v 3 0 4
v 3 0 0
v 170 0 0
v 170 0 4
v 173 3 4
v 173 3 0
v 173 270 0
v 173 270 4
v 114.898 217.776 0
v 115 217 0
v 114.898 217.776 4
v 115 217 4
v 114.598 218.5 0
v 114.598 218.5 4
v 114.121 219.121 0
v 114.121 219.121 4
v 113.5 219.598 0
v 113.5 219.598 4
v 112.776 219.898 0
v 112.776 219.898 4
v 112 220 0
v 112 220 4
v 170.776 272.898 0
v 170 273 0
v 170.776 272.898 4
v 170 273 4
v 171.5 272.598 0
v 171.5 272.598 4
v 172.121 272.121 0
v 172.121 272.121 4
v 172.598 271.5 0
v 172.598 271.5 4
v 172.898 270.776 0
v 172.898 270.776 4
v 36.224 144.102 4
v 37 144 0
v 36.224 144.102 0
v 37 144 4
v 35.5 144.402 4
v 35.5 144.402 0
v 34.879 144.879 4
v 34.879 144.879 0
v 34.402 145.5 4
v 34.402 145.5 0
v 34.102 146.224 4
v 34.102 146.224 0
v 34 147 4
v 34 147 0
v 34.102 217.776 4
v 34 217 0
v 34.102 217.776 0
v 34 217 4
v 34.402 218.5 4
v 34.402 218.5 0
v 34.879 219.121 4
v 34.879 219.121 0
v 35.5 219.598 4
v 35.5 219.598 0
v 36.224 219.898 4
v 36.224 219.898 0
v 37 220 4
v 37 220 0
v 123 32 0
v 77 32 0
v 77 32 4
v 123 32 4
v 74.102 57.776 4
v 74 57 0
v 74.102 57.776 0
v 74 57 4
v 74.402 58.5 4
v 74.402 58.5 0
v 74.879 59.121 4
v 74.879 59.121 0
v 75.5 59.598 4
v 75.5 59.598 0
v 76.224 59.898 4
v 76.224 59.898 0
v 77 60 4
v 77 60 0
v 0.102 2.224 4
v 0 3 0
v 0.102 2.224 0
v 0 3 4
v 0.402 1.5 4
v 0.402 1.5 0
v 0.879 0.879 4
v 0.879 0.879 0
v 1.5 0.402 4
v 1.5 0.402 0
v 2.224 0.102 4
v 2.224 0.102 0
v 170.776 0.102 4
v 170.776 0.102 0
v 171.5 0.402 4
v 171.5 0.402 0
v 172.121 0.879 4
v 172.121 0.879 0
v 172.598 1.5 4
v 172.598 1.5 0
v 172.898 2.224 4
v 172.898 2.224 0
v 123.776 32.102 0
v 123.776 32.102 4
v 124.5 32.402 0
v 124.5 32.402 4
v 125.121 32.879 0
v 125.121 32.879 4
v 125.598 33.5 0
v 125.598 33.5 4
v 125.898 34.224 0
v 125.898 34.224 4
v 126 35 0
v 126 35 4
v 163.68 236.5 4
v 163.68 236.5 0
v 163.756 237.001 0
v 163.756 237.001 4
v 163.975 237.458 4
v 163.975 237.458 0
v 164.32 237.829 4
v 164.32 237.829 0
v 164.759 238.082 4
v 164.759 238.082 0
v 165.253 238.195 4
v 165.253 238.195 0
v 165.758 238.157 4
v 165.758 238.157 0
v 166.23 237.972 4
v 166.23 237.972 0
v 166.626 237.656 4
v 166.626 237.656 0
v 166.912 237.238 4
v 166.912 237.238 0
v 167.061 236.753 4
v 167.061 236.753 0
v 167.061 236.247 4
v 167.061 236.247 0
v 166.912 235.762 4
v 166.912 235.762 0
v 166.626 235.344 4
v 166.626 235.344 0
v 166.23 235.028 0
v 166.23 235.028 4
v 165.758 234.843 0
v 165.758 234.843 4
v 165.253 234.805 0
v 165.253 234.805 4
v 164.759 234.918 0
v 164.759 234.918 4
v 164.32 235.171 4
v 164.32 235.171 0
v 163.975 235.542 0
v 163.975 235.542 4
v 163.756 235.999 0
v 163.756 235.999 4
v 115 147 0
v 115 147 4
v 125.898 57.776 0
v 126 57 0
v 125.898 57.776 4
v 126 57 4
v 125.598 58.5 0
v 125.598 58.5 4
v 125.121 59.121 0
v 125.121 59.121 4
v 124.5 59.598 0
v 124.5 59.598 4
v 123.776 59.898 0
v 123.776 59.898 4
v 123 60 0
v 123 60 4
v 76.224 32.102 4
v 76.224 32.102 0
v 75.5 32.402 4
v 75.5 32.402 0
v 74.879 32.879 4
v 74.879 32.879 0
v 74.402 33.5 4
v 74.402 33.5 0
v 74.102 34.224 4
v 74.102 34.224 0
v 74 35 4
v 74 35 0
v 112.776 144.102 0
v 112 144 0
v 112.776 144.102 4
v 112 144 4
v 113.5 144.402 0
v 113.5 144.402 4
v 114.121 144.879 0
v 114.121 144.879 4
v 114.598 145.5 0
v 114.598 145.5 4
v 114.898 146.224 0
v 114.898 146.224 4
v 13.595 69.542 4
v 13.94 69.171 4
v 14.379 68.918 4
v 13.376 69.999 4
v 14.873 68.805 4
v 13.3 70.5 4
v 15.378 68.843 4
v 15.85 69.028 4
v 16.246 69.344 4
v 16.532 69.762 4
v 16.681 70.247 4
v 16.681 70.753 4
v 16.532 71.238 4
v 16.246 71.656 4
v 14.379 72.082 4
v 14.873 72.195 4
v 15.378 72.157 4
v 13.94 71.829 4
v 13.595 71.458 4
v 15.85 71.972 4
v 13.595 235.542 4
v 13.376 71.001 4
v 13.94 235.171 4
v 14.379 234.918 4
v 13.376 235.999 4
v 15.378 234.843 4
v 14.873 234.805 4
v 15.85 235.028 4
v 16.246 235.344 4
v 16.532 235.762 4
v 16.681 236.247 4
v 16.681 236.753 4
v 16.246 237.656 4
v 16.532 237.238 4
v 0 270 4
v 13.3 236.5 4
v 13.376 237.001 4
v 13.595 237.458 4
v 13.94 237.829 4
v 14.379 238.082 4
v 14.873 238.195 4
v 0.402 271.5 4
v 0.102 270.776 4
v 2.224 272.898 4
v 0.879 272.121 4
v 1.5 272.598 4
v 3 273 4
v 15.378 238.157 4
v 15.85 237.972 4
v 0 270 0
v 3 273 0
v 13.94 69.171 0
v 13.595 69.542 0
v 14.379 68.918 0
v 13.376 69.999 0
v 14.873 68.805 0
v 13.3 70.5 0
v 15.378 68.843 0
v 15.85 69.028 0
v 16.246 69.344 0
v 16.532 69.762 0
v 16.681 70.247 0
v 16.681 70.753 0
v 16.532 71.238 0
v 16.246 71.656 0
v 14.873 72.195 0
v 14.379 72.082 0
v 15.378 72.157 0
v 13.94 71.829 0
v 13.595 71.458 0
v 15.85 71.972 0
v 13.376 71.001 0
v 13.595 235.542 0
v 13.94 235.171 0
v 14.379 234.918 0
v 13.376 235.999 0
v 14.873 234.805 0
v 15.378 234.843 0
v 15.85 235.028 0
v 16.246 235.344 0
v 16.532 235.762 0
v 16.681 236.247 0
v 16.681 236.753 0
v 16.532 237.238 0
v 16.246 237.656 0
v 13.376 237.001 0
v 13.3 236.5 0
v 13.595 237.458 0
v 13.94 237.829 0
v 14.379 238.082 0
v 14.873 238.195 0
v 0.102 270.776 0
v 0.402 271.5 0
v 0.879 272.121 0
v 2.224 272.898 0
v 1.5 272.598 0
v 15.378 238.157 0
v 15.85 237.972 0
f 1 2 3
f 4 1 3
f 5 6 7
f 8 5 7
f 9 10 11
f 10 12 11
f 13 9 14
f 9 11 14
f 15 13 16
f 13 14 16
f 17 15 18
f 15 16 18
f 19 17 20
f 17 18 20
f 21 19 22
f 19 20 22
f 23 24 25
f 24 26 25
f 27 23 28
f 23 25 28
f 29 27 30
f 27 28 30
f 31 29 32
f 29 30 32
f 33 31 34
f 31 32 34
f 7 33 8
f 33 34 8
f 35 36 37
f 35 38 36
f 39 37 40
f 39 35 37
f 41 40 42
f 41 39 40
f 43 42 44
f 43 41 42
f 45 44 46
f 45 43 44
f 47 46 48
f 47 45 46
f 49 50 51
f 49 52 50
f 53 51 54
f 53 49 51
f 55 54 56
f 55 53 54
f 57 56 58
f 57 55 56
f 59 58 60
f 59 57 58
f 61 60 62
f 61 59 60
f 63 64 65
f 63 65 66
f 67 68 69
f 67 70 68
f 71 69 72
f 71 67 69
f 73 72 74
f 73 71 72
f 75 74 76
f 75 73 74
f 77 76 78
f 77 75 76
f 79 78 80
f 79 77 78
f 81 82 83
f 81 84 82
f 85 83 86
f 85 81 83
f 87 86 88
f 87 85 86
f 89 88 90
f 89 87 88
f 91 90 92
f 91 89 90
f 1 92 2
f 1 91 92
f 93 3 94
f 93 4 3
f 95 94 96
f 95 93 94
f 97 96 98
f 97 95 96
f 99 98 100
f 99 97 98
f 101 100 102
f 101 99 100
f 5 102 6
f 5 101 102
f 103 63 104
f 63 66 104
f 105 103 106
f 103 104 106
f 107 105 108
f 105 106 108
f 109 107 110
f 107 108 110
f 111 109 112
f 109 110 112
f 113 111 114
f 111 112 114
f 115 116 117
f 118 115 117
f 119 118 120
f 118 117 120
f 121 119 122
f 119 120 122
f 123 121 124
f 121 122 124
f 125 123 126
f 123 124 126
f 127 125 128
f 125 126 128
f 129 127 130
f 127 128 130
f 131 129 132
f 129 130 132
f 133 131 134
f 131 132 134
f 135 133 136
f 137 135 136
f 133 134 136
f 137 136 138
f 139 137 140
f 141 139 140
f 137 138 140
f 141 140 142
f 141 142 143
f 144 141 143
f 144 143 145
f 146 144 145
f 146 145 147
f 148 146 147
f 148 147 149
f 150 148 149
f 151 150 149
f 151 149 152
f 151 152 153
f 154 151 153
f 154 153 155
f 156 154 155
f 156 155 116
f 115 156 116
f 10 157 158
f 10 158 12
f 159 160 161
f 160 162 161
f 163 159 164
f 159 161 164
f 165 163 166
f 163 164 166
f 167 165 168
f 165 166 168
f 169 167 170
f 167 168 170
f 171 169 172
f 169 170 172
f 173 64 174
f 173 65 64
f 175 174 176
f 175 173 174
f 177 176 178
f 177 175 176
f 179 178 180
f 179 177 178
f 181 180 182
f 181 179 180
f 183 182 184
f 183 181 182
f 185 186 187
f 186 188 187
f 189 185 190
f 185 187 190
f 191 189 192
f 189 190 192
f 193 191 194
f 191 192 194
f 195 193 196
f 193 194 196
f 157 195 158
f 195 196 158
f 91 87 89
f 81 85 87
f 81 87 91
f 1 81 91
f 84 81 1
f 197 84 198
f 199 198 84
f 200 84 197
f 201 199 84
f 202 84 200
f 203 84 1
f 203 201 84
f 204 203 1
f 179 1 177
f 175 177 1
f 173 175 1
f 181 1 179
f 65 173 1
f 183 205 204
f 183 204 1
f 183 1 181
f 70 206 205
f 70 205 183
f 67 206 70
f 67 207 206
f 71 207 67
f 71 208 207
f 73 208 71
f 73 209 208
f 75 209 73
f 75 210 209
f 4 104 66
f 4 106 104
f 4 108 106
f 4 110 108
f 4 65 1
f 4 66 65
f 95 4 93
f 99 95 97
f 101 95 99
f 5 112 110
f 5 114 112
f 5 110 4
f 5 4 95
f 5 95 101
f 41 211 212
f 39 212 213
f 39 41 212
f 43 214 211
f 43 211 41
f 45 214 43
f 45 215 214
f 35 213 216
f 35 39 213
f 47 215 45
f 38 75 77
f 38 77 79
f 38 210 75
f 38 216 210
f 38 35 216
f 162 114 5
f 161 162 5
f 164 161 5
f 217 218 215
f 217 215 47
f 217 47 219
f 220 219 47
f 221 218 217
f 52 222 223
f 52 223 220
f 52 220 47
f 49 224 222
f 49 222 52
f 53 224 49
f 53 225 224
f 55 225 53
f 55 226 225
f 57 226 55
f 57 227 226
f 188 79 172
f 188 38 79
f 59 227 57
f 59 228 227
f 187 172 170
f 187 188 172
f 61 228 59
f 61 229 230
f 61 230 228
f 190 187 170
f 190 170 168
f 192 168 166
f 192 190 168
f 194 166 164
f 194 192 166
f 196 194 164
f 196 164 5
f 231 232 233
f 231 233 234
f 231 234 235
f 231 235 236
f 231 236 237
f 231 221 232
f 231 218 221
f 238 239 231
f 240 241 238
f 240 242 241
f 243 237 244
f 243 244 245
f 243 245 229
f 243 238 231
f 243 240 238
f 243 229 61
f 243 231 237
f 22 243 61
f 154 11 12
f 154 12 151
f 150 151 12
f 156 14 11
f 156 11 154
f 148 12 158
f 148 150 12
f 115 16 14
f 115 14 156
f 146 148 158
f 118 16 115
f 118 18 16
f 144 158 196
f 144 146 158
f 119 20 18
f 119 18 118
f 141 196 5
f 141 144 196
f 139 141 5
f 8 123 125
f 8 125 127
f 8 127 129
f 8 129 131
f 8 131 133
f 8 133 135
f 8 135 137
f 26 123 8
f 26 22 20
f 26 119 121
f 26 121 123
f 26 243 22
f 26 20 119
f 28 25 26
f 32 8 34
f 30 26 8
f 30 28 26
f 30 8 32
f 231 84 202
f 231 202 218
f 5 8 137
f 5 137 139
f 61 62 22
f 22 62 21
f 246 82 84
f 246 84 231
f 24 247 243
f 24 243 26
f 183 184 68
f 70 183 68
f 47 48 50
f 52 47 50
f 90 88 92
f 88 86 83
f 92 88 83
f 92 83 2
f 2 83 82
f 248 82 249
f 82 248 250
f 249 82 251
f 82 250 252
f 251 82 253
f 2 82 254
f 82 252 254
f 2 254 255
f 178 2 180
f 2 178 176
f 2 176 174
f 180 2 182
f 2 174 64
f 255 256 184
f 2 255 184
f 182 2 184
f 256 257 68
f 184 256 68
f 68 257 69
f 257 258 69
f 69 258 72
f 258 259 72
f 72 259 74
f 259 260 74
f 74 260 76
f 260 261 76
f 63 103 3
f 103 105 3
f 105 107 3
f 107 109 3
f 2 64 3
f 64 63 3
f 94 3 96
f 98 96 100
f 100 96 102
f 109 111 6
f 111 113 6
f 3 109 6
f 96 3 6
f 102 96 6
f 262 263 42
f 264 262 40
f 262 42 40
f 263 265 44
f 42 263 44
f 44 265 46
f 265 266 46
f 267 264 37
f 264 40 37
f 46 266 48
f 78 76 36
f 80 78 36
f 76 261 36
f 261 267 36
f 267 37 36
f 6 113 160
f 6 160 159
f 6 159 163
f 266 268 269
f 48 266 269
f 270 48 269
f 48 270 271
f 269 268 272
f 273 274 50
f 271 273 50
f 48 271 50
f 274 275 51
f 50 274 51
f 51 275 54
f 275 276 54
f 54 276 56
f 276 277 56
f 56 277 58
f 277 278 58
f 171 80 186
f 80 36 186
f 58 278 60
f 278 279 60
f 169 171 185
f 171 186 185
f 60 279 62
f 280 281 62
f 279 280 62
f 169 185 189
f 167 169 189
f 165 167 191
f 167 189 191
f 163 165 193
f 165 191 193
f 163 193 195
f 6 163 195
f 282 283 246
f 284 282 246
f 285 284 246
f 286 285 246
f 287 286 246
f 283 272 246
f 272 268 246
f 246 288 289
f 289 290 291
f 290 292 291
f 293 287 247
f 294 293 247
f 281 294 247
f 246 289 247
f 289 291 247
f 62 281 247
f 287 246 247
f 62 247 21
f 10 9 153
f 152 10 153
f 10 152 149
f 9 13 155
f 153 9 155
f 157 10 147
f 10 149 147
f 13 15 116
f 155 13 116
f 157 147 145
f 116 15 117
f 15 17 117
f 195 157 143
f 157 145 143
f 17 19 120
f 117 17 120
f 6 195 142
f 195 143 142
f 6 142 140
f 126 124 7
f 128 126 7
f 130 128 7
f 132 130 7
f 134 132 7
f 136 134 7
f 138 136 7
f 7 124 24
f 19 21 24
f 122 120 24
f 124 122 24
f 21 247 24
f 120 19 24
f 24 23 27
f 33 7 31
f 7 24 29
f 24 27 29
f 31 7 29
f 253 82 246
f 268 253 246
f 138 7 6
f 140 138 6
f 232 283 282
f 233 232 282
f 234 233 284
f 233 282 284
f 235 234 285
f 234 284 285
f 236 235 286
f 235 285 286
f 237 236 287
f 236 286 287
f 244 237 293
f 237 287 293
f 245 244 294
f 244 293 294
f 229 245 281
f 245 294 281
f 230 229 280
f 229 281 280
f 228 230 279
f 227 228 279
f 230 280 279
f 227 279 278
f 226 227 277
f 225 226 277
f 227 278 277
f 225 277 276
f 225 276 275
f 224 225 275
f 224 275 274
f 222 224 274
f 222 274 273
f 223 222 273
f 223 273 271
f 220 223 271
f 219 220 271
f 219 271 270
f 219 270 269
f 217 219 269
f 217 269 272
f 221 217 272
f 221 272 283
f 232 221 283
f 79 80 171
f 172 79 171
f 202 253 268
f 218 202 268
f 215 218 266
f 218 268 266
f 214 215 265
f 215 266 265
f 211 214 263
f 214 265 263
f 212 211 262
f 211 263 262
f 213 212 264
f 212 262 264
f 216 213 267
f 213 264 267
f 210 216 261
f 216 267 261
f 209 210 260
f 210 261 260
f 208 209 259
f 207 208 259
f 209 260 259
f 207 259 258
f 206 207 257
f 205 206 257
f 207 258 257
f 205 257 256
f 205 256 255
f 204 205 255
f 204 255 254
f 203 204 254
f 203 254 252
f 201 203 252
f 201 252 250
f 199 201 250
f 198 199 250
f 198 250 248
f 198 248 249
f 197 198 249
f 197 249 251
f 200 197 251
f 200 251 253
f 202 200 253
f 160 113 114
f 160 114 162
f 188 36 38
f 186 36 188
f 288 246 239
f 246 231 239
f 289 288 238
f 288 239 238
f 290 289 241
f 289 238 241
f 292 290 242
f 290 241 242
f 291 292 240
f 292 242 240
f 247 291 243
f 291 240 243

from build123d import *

# Parameters (mm, degrees)
ESQUISSE1_W        = 173
ESQUISSE1_H        = 273
ESQUISSE1_R        = 1.5
ESQUISSE1_W_2      = 52
ESQUISSE1_H_2      = 28
ESQUISSE1_W_3      = 81
ESQUISSE1_H_3      = 76
BOSS_EXTRU_1_DEPTH = 4
D_GAGEMENT_M31_D   = 3.4
CONG_1_R           = 3


with BuildPart() as part:
    # Esquisse1 → Boss.-Extru.1 (new body)
    with BuildSketch(Plane.XY):
        with Locations((86.5, 136.5)):
            Rectangle(ESQUISSE1_W, ESQUISSE1_H)
        with Locations((15, 236.5)):
            Circle(ESQUISSE1_R, mode=Mode.SUBTRACT)
        with Locations((165.38, 236.5)):
            Circle(ESQUISSE1_R, mode=Mode.SUBTRACT)
        with Locations((15, 70.5)):
            Circle(ESQUISSE1_R, mode=Mode.SUBTRACT)
        with Locations((100, 46)):
            Rectangle(ESQUISSE1_W_2, ESQUISSE1_H_2, mode=Mode.SUBTRACT)
        with Locations((74.5, 182)):
            Rectangle(ESQUISSE1_W_3, ESQUISSE1_H_3, mode=Mode.SUBTRACT)
    extrude(amount=BOSS_EXTRU_1_DEPTH)

    # Dégagement M31 (through all)
    with Locations(Plane.XY.offset(4)):
        with Locations((15, 236.5), (15, 70.5), (165.38, 236.5)):
            Hole(D_GAGEMENT_M31_D / 2)

    # Congé1
    cong_1_edges = [part.edges().sort_by_distance(p)[0] for p in [
        (74, 60, 2),
        (74, 32, 2),
        (126, 32, 2),
        (126, 60, 2),
        (34, 220, 2),
        (34, 144, 2),
        (115, 144, 2),
        (115, 220, 2),
        (0, 273, 2),
        (173, 273, 2),
        (173, 0, 2),
        (0, 0, 2),
    ]]
    fillet(cong_1_edges, radius=CONG_1_R)


solid = part.part
